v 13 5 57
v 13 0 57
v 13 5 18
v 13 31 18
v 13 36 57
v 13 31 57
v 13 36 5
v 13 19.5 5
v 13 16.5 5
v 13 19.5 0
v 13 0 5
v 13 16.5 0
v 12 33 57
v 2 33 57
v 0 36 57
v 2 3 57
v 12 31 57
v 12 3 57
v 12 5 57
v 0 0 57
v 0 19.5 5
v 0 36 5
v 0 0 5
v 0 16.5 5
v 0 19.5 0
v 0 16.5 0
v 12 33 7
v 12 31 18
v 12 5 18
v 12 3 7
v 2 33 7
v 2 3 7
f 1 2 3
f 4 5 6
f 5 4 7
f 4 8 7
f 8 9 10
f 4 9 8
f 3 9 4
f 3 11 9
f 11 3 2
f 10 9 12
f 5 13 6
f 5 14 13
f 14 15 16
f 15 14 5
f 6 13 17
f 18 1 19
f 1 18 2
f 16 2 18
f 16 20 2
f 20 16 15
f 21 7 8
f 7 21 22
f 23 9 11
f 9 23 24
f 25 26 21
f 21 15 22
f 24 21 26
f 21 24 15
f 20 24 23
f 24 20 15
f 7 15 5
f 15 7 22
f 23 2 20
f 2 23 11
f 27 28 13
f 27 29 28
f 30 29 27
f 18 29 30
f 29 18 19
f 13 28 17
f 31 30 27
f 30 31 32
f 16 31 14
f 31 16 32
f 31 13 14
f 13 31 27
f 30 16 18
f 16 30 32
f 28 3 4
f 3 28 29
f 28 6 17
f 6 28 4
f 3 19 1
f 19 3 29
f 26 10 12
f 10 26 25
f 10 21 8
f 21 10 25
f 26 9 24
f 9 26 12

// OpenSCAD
runner_w = 10;
runner_l = 30;
runner_h = 50;
back_wall_t = 2;
side_wall_t = 3;
lip_t = 1;
side_lip = 2;
back_lip = 10;
tab_t = 3;
tab_h = 5;

cutout_w = lip_t + 2;
cutout_l = runner_l - side_lip * 2;
cutout_h = runner_h - back_lip;

outer_w = runner_w + back_wall_t + lip_t;
outer_l = runner_l + side_wall_t * 2;
outer_h = runner_h + back_wall_t;

tab_l = outer_w;

translate([0, 0, tab_h])
difference() {
cube(size=[outer_w, outer_l, outer_h], center=false);
translate([back_wall_t, side_wall_t, back_wall_t])
cube(size=[runner_w, runner_l, runner_h + 1],
    center=false);

translate([outer_w - lip_t - 1, side_wall_t + side_lip, side_wall_t + back_lip])
cube(size=[cutout_w, cutout_l, cutout_h],
    center=false);
}
translate([0, (outer_l - tab_t)/2, 0])
cube(size=[tab_l, tab_t, tab_h + 0.1], center=false);
